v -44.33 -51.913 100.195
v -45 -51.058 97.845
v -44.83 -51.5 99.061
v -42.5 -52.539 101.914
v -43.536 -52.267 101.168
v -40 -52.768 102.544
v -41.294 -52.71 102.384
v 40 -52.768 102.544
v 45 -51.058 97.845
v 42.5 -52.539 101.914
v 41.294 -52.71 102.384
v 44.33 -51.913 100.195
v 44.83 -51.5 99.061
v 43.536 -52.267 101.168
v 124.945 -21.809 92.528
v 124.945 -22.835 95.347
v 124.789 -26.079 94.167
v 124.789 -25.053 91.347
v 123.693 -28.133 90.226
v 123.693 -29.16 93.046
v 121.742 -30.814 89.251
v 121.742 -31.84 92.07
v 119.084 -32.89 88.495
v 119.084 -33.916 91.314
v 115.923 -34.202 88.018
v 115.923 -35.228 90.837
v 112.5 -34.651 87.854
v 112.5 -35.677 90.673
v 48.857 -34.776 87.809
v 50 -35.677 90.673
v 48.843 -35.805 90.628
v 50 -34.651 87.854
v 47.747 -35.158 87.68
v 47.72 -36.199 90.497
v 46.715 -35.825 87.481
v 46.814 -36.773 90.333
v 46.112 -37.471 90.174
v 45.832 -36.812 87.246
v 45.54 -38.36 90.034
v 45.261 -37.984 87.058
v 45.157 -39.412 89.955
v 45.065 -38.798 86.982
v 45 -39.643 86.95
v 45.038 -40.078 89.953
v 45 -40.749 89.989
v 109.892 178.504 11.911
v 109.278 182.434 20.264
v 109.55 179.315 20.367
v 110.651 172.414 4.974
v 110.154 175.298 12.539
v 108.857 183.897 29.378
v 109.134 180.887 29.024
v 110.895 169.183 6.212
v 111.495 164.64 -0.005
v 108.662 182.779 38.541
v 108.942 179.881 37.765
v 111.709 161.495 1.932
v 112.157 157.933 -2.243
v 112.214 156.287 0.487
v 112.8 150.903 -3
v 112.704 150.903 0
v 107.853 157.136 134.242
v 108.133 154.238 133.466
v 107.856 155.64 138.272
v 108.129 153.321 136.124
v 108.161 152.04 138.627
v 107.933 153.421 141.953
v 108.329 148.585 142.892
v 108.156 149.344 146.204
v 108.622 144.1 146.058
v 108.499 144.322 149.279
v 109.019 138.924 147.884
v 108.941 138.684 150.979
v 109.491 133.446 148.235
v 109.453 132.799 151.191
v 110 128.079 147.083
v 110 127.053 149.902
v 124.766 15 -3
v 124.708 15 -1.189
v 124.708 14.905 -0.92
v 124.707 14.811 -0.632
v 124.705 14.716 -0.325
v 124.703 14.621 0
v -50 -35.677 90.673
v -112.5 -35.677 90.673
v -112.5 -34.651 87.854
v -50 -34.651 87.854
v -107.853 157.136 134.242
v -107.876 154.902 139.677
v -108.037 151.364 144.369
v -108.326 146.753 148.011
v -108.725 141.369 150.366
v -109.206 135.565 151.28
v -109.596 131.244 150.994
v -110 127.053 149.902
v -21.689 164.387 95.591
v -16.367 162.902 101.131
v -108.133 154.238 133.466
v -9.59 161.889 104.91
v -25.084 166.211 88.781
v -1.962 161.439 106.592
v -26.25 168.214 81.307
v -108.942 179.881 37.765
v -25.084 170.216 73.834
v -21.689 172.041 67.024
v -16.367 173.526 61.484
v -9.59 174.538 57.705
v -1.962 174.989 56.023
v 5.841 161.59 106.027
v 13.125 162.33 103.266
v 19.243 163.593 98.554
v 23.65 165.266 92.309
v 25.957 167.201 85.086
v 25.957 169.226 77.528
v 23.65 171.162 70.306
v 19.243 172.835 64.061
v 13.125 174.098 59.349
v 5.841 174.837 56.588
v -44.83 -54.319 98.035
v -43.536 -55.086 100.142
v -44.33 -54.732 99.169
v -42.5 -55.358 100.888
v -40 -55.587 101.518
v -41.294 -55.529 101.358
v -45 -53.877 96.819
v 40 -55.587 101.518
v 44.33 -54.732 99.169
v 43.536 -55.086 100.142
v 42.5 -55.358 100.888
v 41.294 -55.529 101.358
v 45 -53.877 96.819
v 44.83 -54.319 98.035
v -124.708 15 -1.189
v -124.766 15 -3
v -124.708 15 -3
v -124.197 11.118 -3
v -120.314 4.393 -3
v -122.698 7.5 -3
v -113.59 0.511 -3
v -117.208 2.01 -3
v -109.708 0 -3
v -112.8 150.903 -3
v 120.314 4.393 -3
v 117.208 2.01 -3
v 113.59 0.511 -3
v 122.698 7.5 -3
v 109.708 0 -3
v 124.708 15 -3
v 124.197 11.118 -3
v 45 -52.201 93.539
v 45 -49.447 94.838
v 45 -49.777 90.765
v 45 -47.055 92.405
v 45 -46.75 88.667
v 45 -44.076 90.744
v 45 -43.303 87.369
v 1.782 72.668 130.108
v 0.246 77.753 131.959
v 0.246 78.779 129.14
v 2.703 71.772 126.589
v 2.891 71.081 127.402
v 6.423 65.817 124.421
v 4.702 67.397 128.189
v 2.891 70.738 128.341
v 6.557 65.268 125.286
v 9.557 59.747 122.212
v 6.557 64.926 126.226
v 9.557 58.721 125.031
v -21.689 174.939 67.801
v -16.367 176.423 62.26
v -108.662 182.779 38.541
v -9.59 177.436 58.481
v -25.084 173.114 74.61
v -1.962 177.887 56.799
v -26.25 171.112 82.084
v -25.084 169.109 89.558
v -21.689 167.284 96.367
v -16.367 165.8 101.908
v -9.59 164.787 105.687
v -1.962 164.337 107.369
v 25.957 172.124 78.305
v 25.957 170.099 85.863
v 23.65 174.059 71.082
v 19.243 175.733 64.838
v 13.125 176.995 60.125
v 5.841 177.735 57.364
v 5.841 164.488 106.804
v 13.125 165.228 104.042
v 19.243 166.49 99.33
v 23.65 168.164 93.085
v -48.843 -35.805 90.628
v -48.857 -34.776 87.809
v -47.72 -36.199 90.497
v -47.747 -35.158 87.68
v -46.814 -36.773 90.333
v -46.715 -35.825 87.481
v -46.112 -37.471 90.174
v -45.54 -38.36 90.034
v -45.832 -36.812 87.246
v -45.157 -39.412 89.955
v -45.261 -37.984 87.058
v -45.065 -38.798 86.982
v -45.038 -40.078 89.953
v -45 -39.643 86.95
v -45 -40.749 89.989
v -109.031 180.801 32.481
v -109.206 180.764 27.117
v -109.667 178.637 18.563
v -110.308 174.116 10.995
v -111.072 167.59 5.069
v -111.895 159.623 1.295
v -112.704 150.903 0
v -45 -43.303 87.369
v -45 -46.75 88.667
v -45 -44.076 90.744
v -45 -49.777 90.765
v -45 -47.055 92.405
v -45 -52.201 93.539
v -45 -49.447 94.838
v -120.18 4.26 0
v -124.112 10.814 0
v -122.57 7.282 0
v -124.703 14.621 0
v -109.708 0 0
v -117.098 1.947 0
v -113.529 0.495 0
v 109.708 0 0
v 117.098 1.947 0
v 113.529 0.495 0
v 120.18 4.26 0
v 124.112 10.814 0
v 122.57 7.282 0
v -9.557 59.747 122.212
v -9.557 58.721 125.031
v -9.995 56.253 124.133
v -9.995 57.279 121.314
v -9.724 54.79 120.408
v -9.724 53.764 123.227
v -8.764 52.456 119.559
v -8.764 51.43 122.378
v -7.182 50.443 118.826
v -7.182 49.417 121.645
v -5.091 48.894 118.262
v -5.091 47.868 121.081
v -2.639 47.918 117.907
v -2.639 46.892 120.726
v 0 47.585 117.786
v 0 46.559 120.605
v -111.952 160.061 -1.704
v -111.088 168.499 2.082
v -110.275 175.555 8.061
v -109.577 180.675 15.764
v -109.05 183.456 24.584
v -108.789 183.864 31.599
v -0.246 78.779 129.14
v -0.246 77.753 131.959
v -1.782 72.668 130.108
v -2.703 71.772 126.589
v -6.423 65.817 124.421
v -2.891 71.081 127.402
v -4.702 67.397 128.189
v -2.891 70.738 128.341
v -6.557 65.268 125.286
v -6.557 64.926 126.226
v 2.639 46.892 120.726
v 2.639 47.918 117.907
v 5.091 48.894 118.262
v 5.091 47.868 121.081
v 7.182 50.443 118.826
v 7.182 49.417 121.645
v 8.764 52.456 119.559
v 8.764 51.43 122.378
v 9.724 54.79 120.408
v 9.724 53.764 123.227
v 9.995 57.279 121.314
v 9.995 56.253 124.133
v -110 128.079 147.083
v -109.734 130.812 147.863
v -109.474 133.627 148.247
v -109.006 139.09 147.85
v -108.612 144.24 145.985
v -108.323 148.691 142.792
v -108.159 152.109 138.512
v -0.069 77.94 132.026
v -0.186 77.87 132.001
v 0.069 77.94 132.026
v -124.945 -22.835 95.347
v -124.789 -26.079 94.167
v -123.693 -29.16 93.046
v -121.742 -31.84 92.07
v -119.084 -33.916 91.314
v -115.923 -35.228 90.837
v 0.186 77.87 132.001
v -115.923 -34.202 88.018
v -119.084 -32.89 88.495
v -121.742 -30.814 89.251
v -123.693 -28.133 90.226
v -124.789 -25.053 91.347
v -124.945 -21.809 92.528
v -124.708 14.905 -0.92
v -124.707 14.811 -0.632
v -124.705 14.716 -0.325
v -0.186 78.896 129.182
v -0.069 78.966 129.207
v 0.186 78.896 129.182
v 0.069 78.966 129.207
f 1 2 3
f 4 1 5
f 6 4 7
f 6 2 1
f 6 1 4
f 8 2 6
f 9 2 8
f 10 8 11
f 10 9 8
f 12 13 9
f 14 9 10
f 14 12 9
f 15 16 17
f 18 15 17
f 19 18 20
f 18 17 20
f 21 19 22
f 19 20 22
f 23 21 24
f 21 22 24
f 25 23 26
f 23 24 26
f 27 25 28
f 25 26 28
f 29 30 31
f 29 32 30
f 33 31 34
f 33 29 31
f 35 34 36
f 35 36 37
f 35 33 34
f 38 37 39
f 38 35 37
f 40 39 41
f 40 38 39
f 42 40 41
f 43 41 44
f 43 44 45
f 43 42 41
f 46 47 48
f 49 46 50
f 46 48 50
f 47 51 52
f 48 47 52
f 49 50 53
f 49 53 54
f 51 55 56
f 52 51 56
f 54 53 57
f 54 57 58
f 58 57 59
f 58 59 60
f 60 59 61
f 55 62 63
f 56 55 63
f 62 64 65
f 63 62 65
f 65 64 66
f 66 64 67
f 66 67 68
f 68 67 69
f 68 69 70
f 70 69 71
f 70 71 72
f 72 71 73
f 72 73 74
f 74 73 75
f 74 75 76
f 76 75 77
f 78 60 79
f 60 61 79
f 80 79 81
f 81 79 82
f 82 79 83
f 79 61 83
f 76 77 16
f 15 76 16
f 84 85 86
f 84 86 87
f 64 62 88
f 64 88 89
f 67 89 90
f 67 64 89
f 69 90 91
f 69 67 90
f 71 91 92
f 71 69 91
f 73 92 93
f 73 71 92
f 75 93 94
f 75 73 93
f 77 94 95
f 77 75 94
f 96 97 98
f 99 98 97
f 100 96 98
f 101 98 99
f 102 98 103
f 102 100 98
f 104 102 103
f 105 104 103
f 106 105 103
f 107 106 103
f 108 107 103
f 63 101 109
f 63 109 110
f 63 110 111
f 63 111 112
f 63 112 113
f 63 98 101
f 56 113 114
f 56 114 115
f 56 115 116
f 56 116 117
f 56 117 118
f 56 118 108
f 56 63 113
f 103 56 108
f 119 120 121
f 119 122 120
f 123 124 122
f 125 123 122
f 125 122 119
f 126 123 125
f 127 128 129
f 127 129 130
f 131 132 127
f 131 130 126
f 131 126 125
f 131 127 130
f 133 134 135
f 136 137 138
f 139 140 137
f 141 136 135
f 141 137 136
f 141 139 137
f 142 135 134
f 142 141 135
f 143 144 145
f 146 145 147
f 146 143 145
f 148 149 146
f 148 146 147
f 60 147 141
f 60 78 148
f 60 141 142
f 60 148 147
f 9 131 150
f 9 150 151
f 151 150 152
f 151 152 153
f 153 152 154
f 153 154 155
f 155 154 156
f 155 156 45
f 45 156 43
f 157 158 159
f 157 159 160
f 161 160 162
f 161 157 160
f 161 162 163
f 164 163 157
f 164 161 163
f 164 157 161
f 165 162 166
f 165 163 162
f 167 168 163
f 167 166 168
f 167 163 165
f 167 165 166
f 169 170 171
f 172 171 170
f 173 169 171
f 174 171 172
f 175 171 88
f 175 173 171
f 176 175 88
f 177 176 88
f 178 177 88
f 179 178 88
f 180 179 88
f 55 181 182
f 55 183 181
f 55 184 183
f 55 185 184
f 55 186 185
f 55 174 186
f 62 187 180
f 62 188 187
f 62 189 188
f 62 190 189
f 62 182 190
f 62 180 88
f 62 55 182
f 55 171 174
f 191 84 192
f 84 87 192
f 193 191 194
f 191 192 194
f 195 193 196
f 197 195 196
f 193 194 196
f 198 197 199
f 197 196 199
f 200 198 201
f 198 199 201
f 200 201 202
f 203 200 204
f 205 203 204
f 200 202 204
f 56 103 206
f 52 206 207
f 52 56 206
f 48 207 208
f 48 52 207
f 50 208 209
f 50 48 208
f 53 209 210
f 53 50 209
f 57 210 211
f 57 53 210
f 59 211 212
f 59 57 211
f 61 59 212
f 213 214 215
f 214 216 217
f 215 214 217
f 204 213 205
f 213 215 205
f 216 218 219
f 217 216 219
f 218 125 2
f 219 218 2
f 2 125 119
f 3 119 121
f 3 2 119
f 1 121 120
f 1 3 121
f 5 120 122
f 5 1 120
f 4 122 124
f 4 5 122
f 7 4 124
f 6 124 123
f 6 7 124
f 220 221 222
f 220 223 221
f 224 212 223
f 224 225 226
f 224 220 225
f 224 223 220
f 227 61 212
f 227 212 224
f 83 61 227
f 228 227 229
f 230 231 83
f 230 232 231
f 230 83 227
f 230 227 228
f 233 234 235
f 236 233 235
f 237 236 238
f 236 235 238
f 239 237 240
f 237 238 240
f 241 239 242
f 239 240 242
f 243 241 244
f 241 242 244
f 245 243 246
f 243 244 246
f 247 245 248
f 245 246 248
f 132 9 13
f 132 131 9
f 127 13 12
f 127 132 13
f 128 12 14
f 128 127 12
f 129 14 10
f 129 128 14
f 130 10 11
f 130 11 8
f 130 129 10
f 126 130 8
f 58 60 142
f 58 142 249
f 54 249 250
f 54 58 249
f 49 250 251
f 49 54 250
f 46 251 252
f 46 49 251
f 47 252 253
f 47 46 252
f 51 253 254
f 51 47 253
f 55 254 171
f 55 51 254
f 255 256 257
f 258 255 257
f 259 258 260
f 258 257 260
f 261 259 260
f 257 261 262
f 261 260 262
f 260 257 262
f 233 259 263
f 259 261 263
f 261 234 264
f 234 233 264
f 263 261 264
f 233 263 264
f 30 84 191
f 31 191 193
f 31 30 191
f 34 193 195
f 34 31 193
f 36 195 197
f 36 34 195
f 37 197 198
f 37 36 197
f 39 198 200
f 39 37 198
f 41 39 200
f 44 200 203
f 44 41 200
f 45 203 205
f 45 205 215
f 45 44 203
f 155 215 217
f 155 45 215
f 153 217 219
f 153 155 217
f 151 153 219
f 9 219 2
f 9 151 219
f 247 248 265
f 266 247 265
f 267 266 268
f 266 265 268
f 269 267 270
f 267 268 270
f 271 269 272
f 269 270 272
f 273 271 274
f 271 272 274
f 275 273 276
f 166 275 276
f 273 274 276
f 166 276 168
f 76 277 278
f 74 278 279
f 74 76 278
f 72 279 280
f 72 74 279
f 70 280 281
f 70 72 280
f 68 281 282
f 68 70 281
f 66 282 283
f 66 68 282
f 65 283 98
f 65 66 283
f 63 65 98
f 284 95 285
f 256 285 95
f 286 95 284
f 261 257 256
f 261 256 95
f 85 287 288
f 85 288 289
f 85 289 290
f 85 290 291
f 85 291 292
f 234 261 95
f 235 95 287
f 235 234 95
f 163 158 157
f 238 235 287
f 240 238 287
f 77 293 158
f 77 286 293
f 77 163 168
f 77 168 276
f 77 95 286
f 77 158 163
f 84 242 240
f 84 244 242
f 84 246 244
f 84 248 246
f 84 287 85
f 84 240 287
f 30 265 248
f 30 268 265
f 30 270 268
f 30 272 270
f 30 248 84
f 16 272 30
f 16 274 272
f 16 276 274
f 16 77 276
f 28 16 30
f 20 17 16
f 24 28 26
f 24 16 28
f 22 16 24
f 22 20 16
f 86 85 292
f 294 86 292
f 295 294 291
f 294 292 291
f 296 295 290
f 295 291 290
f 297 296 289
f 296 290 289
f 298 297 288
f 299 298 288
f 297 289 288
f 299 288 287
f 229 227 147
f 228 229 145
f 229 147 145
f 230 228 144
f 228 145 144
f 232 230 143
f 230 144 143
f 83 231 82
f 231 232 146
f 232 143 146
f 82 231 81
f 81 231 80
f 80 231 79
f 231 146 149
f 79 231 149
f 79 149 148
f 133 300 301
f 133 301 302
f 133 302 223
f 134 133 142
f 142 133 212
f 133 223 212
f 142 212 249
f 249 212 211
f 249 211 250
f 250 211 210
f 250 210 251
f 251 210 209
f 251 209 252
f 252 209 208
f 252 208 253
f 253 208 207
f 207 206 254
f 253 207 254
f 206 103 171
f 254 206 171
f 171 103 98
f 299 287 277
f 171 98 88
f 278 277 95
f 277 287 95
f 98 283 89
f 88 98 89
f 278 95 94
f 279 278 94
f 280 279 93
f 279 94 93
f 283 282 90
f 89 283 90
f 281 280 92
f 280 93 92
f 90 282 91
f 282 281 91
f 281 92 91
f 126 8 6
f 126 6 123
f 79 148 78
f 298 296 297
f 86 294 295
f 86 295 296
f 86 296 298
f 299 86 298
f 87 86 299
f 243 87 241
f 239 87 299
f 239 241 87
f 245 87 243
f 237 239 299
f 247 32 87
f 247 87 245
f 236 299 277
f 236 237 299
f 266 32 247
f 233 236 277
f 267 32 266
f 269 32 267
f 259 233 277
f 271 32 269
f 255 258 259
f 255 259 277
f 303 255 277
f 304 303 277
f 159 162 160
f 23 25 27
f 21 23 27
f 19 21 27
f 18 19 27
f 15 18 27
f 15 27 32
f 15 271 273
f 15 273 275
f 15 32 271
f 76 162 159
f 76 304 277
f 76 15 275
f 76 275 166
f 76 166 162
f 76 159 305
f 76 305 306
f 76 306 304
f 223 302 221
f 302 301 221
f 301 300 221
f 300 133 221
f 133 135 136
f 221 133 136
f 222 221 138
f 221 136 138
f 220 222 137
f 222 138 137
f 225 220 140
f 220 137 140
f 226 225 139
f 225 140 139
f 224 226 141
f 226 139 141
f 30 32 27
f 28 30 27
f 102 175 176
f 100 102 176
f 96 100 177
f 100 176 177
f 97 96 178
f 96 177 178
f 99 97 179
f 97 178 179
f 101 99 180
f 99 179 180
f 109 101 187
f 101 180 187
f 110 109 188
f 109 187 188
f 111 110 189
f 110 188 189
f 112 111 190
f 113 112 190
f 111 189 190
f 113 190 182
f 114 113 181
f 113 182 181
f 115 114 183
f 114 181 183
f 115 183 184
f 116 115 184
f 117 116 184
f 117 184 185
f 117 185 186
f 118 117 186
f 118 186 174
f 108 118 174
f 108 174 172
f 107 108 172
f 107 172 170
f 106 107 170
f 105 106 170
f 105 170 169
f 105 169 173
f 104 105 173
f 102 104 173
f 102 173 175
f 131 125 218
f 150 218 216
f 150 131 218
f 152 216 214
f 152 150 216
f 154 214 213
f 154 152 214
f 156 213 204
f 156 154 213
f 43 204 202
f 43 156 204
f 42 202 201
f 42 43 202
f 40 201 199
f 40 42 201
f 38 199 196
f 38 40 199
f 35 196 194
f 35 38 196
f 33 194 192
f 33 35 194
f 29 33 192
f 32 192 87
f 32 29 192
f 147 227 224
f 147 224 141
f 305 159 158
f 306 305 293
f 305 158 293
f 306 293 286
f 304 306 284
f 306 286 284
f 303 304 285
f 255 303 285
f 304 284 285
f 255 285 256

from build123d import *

# Parameters (mm, degrees)
F1_DEPTH  = 125
F2_R      = 26.25
F3_DEPTH  = 25
F4_W      = 97.6103432477
F4_H      = 17.1008444879
F5_DEPTH  = 22.5
F7_DEPTH  = 223
F9_DEPTH  = 25
F10_R     = 5
F12_DEPTH = 25


with BuildPart() as f1:
    # F0 (on Right) → F1 (new body, symmetric)
    with BuildSketch(Plane.YZ):
        with BuildLine():
            Line((150.9032388148, 0), (0, 0))
            Line((0, 0), (0, -3.0000018725))
            Line((0, -3.0000018725), (150.9032388148, -3.0000018725))
            ThreePointArc((150.9032388148, -3.0000018725), (177.0839005299, 9.9108717028), (182.778792891, 38.541028973))
            Line((182.778792891, 38.541028973), (157.1357605543, 134.2421285136))
            ThreePointArc((157.1357605543, 134.2421285136), (145.53968371, 148.6905408156), (127.0530008041, 149.9022220292))
            Line((127.0530008041, 149.9022220292), (-35.6771693401, 90.6732838797))
            ThreePointArc((-35.6771693401, 90.6732838797), (-44.8528287691, 91.0739018222), (-51.0577201094, 97.8453524901))
            Line((-51.0577201094, 97.8453524901), (-52.767820826, 102.543815594))
            Line((-52.767820826, 102.543815594), (-55.586900448, 101.5177545236))
            Line((-55.586900448, 101.5177545236), (-53.8767997313, 96.8192914196))
            ThreePointArc((-53.8767997313, 96.8192914196), (-46.1206843457, 88.354976764), (-34.6511082697, 87.8542042577))
            Line((-34.6511082697, 87.8542042577), (128.0790618745, 147.0831424073))
            ThreePointArc((128.0790618745, 147.0831424073), (144.1544370057, 146.0295066551), (154.2379812668, 133.4656708936))
            Line((154.2379812668, 133.4656708936), (179.8810136034, 37.7645713531))
            ThreePointArc((179.8810136034, 37.7645713531), (174.7038390235, 11.7371571297), (150.9032388148, 0))
        make_face()
    extrude(amount=F1_DEPTH, both=True)

    # F2 (on face) → F3 (cut)
    with BuildSketch(Plane(origin=(0, 180.1701926471, 48.2764576199), x_dir=(-1, 0, 0), z_dir=(0, 0.9659258263, 0.2588190451))):
        with Locations((0, 35)):
            Circle(F2_R)
    extrude(amount=-F3_DEPTH, mode=Mode.SUBTRACT)

    # F4 (on face) → F5 (cut, symmetric)
    with BuildSketch(Plane(origin=(0, -33.3152677142, 91.5329457678), x_dir=(1, 0, 0), z_dir=(0, -0.3420201433, 0.9396926208))):
        with Locations((93.8051716238, -11.063905455)):
            Rectangle(F4_W, F4_H)
        with Locations((-93.8051716238, -11.063905455)):
            Rectangle(F4_W, F4_H)
    extrude(amount=F5_DEPTH, both=True, mode=Mode.SUBTRACT)

    # F6 (on face) → F7 (cut)
    with BuildSketch(Plane(origin=(0, -33.3152677142, 91.5329457678), x_dir=(1, 0, 0), z_dir=(0, -0.3420201433, 0.9396926208))):
        with BuildLine():
            Line((-124.9454884285, 11.1526290369), (-110, 170.6603467676))
            Line((-110, 170.6603467676), (-107.1620267497, 200.9489946296))
            Line((-107.1620267497, 200.9489946296), (-152.5835648179, 200.9489946296))
            Line((-152.5835648179, 200.9489946296), (-152.5835648179, -22.4528324986))
            Line((-152.5835648179, -22.4528324986), (-112.5, -22.4528324986))
            Line((-112.5, -22.4528324986), (-112.5, -2.5134832111))
            ThreePointArc((-112.5, -2.5134832111), (-121.74192629, 1.5700568176), (-124.9454884285, 11.1526290369))
        make_face()
        with BuildLine():
            Line((112.5, -2.5134832111), (112.5, -22.4528324986))
            Line((112.5, -22.4528324986), (152.5835648179, -22.4528324986))
            Line((152.5835648179, -22.4528324986), (152.5835648179, 200.9489946296))
            Line((152.5835648179, 200.9489946296), (107.1620267497, 200.9489946296))
            Line((107.1620267497, 200.9489946296), (110, 170.6603467676))
            Line((110, 170.6603467676), (124.9454884285, 11.1526290369))
            ThreePointArc((124.9454884285, 11.1526290369), (121.74192629, 1.5700568176), (112.5, -2.5134832111))
        make_face()
    extrude(amount=-F7_DEPTH, mode=Mode.SUBTRACT)

    # F8 (on face) → F9 (cut)
    with BuildSketch(Plane(origin=(0, 0, -3.0000018725), x_dir=(1, 0, 0), z_dir=(0, 0, -1))):
        with BuildLine():
            ThreePointArc((-124.7078686175, -15), (-120.3144703352, -4.3933982822), (-109.7078686175, 0))
            Line((-109.7078686175, 0), (-109.7078686175, 1.8405353206))
            Line((-109.7078686175, 1.8405353206), (-139.135748148, 2.5484173093))
            Line((-139.135748148, 2.5484173093), (-139.135748148, -15))
            Line((-139.135748148, -15), (-124.7078686175, -15))
        make_face()
        with BuildLine():
            Line((109.7078686175, 1.8405353206), (109.7078686175, 0))
            ThreePointArc((109.7078686175, 0), (120.3144703352, -4.3933982822), (124.7078686175, -15))
            Line((124.7078686175, -15), (139.135748148, -15))
            Line((139.135748148, -15), (139.135748148, 2.5484173093))
            Line((139.135748148, 2.5484173093), (109.7078686175, 1.8405353206))
        make_face()
    extrude(amount=-F9_DEPTH, mode=Mode.SUBTRACT)

    # F10
    f10_edges = [f1.edges().sort_by_distance(p)[0] for p in [
        (-45, -35.164139, 89.263744),
        (45, -35.164139, 89.263744),
        (45, -54.177361, 102.030785),
        (-45, -54.177361, 102.030785),
    ]]
    fillet(f10_edges, radius=F10_R)

    # F11 (on face) → F12 (cut)
    with BuildSketch(Plane(origin=(0, -33.3152677142, 91.5329457678), x_dir=(1, 0, 0), z_dir=(0, -0.3420201433, 0.9396926208))):
        with BuildLine():
            ThreePointArc((-9.5571116428, 97.9430625287), (-8.0445828135, 89.0599084724), (0, 85))
            ThreePointArc((0, 85), (8.0445828135, 89.0599084724), (9.5571116428, 97.9430625287))
            add(Edge.make_bspline(
                [(0.2464486877, 118.196647138), (1.8167264508, 108.9800336214), (7.4531598076, 104.7753001668), (9.5571116428, 97.9430625287)],
                knots=[1.4245432684, 1.4245432684, 1.4245432684, 1.4245432684, 24.0384457394, 24.0384457394, 24.0384457394, 24.0384457394], degree=3))
            ThreePointArc((0.2464486877, 118.196647138), (0, 118.4046585168), (-0.2464486877, 118.196647138))
            add(Edge.make_bspline(
                [(-0.2464486877, 118.196647138), (-1.8167264508, 108.9800336214), (-7.4531598076, 104.7753001668), (-9.5571116428, 97.9430625287)],
                knots=[1.4245432684, 1.4245432684, 1.4245432684, 1.4245432684, 24.0384457394, 24.0384457394, 24.0384457394, 24.0384457394], degree=3))
        make_face()
    extrude(amount=-F12_DEPTH, mode=Mode.SUBTRACT)


solid = f1.part
